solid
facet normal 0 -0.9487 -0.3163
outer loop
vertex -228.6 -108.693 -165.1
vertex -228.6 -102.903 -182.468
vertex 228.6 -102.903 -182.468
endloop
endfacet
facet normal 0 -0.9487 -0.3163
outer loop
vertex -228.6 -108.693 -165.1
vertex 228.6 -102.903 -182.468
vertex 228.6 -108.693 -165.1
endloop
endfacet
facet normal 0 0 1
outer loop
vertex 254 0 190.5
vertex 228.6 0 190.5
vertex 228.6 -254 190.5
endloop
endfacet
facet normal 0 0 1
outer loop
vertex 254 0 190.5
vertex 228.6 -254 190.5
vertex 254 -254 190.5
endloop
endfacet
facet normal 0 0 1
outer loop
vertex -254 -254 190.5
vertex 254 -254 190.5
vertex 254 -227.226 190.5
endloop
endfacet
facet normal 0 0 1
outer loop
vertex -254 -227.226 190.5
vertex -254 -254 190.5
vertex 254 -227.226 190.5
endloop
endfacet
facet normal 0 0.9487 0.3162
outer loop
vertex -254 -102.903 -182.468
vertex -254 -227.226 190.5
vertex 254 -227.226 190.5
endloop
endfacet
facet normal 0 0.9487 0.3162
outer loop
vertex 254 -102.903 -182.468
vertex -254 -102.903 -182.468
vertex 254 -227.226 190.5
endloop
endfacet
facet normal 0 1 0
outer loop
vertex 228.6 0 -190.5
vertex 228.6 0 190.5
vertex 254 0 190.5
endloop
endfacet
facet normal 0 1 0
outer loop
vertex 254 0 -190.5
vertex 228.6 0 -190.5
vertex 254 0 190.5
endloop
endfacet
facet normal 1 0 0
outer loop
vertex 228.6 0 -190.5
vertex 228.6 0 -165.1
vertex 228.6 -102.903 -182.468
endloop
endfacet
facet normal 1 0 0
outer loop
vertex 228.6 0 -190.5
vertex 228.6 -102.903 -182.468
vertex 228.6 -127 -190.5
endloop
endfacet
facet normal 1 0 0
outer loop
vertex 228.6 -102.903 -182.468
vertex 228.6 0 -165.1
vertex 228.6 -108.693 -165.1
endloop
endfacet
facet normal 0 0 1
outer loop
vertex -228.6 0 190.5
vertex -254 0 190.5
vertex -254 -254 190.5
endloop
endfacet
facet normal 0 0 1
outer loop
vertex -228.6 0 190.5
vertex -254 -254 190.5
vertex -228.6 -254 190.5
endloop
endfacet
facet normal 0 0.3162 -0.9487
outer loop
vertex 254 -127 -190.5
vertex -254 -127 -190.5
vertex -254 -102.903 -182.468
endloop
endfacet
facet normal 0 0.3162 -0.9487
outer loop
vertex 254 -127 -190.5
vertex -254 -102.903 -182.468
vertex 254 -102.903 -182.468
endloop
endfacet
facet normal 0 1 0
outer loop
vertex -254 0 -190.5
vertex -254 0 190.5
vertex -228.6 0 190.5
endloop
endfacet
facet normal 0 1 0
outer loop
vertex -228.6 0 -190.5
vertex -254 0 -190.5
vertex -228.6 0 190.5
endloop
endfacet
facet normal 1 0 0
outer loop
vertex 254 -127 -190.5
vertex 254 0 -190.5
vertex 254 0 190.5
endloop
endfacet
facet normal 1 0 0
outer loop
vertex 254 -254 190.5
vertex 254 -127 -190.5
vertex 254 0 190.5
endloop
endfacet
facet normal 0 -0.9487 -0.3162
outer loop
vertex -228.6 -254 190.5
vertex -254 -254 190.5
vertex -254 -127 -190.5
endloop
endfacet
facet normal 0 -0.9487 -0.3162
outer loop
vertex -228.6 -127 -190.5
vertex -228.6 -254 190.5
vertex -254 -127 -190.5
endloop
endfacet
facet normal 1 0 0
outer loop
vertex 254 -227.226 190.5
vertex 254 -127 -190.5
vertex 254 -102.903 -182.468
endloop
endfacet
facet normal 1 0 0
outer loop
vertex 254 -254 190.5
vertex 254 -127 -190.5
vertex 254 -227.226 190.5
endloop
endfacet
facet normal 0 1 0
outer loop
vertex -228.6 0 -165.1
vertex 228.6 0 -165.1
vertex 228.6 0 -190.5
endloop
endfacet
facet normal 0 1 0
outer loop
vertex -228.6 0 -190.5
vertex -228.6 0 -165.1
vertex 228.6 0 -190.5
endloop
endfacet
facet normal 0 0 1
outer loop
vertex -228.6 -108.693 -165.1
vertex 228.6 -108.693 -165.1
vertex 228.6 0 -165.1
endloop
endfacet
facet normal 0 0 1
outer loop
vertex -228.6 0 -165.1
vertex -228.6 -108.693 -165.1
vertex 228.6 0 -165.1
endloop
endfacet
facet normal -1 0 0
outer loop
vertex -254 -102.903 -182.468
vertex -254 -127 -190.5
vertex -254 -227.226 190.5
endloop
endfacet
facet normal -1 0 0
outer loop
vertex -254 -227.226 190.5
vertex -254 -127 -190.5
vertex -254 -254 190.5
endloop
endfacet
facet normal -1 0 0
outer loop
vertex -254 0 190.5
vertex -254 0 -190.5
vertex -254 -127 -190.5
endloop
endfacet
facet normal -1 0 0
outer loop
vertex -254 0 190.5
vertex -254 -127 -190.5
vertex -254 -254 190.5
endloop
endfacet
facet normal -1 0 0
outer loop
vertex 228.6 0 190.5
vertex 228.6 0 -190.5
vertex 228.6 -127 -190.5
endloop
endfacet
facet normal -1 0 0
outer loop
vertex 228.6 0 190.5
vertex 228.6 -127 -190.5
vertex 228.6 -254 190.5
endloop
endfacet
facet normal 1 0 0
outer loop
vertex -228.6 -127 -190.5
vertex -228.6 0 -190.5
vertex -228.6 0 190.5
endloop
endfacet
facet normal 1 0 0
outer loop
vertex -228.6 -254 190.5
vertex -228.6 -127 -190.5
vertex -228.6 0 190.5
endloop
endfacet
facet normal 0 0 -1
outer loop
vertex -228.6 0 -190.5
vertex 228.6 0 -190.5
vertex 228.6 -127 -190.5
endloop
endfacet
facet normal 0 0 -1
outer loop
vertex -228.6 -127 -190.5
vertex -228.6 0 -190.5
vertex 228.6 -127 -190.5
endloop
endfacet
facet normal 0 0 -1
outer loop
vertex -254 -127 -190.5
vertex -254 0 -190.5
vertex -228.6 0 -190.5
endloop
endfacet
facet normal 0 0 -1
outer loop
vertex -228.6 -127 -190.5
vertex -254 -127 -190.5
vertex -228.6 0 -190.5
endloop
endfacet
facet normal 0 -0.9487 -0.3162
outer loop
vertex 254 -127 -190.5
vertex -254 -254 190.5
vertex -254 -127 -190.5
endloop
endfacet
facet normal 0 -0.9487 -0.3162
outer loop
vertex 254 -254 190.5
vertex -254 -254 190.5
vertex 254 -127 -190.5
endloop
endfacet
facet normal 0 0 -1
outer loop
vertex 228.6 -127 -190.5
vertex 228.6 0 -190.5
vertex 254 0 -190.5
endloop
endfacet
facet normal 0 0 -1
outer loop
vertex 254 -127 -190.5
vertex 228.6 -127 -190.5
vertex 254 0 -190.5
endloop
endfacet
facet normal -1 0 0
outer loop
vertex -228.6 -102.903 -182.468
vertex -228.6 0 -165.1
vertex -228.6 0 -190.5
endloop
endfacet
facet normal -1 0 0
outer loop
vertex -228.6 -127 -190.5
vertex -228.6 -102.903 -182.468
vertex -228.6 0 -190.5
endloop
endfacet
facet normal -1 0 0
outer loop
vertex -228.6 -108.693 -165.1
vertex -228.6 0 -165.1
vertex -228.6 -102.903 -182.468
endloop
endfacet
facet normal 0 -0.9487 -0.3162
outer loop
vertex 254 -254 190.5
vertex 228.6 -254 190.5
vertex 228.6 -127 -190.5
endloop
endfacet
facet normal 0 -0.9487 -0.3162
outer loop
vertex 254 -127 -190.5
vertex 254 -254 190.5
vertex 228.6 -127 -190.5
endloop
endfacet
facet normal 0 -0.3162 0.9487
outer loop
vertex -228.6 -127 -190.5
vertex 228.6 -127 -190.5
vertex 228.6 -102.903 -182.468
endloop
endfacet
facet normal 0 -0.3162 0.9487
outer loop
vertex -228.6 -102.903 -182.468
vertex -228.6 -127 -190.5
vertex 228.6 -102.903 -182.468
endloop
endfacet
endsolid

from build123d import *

# Parameters (mm, degrees)
F1_W      = 25.4
F1_H      = 381
F2_DEPTH  = 254
F4_DEPTH  = 635
F5_W      = 508
F5_H      = 401.6092628414
F6_DEPTH  = 25.4
F9_DEPTH  = 457.2
F10_DEPTH = 508.001


with BuildPart() as f2:
    # F1 (on face) → F2 (new body)
    with BuildSketch(Plane.XZ):
        with Locations((-241.3, 0)):
            Rectangle(F1_W, F1_H)
    extrude(amount=F2_DEPTH)


with BuildPart() as f2b:
    # F1 (on face) → F2, piece 2 (new body)
    with BuildSketch(Plane.XZ):
        with Locations((241.3, 0)):
            Rectangle(F1_W, F1_H)
    extrude(amount=F2_DEPTH)


with BuildPart() as f4_tool:
    # F3 (on face) → F4 (new body)
    with BuildSketch(Plane(origin=(-254, 0, 0), x_dir=(0, -1, 0), z_dir=(-1, 0, 0))):
        Polygon((127, -190.5), (254, -190.5), (254, 190.5), align=None)
    extrude(amount=-F4_DEPTH)


with BuildPart() as f2_1:
    add(f2.part)

    # F4: cut by f4_tool
    add(f4_tool.part, mode=Mode.SUBTRACT)


with BuildPart() as f2b_1:
    add(f2b.part)

    # F4: cut by f4_tool
    add(f4_tool.part, mode=Mode.SUBTRACT)


with BuildPart() as f6:
    # F5 (on face) → F6 (new body)
    with BuildSketch(Plane(origin=(0, -171.45, -57.15), x_dir=(1, 0, 0), z_dir=(0, -0.9486832981, -0.316227766))):
        with Locations((0, 60.2413894262)):
            Rectangle(F5_W, F5_H)
    extrude(amount=-F6_DEPTH)

    # F7 (on face) → F10 (cut, through all)
    with BuildSketch(Plane.YZ.offset(254)):
        Polygon((-227.2260491439, 190.5), (-229.9034442295, 198.5321852568), (-254, 190.5), align=None)
    extrude(amount=-F10_DEPTH, mode=Mode.SUBTRACT)


with BuildPart() as f9:
    # F8 (on face) → F9 (new body, through all)
    with BuildSketch(Plane(origin=(228.6, 0, 0), x_dir=(0, -1, 0), z_dir=(-1, 0, 0))):
        Polygon((0, -190.5), (127, -190.5), (102.9034442295, -182.4678147432), (108.6927158106, -165.1), (0, -165.1), align=None)
    extrude(amount=F9_DEPTH)


solid = Compound([f2_1.part, f2b_1.part, f6.part, f9.part])
